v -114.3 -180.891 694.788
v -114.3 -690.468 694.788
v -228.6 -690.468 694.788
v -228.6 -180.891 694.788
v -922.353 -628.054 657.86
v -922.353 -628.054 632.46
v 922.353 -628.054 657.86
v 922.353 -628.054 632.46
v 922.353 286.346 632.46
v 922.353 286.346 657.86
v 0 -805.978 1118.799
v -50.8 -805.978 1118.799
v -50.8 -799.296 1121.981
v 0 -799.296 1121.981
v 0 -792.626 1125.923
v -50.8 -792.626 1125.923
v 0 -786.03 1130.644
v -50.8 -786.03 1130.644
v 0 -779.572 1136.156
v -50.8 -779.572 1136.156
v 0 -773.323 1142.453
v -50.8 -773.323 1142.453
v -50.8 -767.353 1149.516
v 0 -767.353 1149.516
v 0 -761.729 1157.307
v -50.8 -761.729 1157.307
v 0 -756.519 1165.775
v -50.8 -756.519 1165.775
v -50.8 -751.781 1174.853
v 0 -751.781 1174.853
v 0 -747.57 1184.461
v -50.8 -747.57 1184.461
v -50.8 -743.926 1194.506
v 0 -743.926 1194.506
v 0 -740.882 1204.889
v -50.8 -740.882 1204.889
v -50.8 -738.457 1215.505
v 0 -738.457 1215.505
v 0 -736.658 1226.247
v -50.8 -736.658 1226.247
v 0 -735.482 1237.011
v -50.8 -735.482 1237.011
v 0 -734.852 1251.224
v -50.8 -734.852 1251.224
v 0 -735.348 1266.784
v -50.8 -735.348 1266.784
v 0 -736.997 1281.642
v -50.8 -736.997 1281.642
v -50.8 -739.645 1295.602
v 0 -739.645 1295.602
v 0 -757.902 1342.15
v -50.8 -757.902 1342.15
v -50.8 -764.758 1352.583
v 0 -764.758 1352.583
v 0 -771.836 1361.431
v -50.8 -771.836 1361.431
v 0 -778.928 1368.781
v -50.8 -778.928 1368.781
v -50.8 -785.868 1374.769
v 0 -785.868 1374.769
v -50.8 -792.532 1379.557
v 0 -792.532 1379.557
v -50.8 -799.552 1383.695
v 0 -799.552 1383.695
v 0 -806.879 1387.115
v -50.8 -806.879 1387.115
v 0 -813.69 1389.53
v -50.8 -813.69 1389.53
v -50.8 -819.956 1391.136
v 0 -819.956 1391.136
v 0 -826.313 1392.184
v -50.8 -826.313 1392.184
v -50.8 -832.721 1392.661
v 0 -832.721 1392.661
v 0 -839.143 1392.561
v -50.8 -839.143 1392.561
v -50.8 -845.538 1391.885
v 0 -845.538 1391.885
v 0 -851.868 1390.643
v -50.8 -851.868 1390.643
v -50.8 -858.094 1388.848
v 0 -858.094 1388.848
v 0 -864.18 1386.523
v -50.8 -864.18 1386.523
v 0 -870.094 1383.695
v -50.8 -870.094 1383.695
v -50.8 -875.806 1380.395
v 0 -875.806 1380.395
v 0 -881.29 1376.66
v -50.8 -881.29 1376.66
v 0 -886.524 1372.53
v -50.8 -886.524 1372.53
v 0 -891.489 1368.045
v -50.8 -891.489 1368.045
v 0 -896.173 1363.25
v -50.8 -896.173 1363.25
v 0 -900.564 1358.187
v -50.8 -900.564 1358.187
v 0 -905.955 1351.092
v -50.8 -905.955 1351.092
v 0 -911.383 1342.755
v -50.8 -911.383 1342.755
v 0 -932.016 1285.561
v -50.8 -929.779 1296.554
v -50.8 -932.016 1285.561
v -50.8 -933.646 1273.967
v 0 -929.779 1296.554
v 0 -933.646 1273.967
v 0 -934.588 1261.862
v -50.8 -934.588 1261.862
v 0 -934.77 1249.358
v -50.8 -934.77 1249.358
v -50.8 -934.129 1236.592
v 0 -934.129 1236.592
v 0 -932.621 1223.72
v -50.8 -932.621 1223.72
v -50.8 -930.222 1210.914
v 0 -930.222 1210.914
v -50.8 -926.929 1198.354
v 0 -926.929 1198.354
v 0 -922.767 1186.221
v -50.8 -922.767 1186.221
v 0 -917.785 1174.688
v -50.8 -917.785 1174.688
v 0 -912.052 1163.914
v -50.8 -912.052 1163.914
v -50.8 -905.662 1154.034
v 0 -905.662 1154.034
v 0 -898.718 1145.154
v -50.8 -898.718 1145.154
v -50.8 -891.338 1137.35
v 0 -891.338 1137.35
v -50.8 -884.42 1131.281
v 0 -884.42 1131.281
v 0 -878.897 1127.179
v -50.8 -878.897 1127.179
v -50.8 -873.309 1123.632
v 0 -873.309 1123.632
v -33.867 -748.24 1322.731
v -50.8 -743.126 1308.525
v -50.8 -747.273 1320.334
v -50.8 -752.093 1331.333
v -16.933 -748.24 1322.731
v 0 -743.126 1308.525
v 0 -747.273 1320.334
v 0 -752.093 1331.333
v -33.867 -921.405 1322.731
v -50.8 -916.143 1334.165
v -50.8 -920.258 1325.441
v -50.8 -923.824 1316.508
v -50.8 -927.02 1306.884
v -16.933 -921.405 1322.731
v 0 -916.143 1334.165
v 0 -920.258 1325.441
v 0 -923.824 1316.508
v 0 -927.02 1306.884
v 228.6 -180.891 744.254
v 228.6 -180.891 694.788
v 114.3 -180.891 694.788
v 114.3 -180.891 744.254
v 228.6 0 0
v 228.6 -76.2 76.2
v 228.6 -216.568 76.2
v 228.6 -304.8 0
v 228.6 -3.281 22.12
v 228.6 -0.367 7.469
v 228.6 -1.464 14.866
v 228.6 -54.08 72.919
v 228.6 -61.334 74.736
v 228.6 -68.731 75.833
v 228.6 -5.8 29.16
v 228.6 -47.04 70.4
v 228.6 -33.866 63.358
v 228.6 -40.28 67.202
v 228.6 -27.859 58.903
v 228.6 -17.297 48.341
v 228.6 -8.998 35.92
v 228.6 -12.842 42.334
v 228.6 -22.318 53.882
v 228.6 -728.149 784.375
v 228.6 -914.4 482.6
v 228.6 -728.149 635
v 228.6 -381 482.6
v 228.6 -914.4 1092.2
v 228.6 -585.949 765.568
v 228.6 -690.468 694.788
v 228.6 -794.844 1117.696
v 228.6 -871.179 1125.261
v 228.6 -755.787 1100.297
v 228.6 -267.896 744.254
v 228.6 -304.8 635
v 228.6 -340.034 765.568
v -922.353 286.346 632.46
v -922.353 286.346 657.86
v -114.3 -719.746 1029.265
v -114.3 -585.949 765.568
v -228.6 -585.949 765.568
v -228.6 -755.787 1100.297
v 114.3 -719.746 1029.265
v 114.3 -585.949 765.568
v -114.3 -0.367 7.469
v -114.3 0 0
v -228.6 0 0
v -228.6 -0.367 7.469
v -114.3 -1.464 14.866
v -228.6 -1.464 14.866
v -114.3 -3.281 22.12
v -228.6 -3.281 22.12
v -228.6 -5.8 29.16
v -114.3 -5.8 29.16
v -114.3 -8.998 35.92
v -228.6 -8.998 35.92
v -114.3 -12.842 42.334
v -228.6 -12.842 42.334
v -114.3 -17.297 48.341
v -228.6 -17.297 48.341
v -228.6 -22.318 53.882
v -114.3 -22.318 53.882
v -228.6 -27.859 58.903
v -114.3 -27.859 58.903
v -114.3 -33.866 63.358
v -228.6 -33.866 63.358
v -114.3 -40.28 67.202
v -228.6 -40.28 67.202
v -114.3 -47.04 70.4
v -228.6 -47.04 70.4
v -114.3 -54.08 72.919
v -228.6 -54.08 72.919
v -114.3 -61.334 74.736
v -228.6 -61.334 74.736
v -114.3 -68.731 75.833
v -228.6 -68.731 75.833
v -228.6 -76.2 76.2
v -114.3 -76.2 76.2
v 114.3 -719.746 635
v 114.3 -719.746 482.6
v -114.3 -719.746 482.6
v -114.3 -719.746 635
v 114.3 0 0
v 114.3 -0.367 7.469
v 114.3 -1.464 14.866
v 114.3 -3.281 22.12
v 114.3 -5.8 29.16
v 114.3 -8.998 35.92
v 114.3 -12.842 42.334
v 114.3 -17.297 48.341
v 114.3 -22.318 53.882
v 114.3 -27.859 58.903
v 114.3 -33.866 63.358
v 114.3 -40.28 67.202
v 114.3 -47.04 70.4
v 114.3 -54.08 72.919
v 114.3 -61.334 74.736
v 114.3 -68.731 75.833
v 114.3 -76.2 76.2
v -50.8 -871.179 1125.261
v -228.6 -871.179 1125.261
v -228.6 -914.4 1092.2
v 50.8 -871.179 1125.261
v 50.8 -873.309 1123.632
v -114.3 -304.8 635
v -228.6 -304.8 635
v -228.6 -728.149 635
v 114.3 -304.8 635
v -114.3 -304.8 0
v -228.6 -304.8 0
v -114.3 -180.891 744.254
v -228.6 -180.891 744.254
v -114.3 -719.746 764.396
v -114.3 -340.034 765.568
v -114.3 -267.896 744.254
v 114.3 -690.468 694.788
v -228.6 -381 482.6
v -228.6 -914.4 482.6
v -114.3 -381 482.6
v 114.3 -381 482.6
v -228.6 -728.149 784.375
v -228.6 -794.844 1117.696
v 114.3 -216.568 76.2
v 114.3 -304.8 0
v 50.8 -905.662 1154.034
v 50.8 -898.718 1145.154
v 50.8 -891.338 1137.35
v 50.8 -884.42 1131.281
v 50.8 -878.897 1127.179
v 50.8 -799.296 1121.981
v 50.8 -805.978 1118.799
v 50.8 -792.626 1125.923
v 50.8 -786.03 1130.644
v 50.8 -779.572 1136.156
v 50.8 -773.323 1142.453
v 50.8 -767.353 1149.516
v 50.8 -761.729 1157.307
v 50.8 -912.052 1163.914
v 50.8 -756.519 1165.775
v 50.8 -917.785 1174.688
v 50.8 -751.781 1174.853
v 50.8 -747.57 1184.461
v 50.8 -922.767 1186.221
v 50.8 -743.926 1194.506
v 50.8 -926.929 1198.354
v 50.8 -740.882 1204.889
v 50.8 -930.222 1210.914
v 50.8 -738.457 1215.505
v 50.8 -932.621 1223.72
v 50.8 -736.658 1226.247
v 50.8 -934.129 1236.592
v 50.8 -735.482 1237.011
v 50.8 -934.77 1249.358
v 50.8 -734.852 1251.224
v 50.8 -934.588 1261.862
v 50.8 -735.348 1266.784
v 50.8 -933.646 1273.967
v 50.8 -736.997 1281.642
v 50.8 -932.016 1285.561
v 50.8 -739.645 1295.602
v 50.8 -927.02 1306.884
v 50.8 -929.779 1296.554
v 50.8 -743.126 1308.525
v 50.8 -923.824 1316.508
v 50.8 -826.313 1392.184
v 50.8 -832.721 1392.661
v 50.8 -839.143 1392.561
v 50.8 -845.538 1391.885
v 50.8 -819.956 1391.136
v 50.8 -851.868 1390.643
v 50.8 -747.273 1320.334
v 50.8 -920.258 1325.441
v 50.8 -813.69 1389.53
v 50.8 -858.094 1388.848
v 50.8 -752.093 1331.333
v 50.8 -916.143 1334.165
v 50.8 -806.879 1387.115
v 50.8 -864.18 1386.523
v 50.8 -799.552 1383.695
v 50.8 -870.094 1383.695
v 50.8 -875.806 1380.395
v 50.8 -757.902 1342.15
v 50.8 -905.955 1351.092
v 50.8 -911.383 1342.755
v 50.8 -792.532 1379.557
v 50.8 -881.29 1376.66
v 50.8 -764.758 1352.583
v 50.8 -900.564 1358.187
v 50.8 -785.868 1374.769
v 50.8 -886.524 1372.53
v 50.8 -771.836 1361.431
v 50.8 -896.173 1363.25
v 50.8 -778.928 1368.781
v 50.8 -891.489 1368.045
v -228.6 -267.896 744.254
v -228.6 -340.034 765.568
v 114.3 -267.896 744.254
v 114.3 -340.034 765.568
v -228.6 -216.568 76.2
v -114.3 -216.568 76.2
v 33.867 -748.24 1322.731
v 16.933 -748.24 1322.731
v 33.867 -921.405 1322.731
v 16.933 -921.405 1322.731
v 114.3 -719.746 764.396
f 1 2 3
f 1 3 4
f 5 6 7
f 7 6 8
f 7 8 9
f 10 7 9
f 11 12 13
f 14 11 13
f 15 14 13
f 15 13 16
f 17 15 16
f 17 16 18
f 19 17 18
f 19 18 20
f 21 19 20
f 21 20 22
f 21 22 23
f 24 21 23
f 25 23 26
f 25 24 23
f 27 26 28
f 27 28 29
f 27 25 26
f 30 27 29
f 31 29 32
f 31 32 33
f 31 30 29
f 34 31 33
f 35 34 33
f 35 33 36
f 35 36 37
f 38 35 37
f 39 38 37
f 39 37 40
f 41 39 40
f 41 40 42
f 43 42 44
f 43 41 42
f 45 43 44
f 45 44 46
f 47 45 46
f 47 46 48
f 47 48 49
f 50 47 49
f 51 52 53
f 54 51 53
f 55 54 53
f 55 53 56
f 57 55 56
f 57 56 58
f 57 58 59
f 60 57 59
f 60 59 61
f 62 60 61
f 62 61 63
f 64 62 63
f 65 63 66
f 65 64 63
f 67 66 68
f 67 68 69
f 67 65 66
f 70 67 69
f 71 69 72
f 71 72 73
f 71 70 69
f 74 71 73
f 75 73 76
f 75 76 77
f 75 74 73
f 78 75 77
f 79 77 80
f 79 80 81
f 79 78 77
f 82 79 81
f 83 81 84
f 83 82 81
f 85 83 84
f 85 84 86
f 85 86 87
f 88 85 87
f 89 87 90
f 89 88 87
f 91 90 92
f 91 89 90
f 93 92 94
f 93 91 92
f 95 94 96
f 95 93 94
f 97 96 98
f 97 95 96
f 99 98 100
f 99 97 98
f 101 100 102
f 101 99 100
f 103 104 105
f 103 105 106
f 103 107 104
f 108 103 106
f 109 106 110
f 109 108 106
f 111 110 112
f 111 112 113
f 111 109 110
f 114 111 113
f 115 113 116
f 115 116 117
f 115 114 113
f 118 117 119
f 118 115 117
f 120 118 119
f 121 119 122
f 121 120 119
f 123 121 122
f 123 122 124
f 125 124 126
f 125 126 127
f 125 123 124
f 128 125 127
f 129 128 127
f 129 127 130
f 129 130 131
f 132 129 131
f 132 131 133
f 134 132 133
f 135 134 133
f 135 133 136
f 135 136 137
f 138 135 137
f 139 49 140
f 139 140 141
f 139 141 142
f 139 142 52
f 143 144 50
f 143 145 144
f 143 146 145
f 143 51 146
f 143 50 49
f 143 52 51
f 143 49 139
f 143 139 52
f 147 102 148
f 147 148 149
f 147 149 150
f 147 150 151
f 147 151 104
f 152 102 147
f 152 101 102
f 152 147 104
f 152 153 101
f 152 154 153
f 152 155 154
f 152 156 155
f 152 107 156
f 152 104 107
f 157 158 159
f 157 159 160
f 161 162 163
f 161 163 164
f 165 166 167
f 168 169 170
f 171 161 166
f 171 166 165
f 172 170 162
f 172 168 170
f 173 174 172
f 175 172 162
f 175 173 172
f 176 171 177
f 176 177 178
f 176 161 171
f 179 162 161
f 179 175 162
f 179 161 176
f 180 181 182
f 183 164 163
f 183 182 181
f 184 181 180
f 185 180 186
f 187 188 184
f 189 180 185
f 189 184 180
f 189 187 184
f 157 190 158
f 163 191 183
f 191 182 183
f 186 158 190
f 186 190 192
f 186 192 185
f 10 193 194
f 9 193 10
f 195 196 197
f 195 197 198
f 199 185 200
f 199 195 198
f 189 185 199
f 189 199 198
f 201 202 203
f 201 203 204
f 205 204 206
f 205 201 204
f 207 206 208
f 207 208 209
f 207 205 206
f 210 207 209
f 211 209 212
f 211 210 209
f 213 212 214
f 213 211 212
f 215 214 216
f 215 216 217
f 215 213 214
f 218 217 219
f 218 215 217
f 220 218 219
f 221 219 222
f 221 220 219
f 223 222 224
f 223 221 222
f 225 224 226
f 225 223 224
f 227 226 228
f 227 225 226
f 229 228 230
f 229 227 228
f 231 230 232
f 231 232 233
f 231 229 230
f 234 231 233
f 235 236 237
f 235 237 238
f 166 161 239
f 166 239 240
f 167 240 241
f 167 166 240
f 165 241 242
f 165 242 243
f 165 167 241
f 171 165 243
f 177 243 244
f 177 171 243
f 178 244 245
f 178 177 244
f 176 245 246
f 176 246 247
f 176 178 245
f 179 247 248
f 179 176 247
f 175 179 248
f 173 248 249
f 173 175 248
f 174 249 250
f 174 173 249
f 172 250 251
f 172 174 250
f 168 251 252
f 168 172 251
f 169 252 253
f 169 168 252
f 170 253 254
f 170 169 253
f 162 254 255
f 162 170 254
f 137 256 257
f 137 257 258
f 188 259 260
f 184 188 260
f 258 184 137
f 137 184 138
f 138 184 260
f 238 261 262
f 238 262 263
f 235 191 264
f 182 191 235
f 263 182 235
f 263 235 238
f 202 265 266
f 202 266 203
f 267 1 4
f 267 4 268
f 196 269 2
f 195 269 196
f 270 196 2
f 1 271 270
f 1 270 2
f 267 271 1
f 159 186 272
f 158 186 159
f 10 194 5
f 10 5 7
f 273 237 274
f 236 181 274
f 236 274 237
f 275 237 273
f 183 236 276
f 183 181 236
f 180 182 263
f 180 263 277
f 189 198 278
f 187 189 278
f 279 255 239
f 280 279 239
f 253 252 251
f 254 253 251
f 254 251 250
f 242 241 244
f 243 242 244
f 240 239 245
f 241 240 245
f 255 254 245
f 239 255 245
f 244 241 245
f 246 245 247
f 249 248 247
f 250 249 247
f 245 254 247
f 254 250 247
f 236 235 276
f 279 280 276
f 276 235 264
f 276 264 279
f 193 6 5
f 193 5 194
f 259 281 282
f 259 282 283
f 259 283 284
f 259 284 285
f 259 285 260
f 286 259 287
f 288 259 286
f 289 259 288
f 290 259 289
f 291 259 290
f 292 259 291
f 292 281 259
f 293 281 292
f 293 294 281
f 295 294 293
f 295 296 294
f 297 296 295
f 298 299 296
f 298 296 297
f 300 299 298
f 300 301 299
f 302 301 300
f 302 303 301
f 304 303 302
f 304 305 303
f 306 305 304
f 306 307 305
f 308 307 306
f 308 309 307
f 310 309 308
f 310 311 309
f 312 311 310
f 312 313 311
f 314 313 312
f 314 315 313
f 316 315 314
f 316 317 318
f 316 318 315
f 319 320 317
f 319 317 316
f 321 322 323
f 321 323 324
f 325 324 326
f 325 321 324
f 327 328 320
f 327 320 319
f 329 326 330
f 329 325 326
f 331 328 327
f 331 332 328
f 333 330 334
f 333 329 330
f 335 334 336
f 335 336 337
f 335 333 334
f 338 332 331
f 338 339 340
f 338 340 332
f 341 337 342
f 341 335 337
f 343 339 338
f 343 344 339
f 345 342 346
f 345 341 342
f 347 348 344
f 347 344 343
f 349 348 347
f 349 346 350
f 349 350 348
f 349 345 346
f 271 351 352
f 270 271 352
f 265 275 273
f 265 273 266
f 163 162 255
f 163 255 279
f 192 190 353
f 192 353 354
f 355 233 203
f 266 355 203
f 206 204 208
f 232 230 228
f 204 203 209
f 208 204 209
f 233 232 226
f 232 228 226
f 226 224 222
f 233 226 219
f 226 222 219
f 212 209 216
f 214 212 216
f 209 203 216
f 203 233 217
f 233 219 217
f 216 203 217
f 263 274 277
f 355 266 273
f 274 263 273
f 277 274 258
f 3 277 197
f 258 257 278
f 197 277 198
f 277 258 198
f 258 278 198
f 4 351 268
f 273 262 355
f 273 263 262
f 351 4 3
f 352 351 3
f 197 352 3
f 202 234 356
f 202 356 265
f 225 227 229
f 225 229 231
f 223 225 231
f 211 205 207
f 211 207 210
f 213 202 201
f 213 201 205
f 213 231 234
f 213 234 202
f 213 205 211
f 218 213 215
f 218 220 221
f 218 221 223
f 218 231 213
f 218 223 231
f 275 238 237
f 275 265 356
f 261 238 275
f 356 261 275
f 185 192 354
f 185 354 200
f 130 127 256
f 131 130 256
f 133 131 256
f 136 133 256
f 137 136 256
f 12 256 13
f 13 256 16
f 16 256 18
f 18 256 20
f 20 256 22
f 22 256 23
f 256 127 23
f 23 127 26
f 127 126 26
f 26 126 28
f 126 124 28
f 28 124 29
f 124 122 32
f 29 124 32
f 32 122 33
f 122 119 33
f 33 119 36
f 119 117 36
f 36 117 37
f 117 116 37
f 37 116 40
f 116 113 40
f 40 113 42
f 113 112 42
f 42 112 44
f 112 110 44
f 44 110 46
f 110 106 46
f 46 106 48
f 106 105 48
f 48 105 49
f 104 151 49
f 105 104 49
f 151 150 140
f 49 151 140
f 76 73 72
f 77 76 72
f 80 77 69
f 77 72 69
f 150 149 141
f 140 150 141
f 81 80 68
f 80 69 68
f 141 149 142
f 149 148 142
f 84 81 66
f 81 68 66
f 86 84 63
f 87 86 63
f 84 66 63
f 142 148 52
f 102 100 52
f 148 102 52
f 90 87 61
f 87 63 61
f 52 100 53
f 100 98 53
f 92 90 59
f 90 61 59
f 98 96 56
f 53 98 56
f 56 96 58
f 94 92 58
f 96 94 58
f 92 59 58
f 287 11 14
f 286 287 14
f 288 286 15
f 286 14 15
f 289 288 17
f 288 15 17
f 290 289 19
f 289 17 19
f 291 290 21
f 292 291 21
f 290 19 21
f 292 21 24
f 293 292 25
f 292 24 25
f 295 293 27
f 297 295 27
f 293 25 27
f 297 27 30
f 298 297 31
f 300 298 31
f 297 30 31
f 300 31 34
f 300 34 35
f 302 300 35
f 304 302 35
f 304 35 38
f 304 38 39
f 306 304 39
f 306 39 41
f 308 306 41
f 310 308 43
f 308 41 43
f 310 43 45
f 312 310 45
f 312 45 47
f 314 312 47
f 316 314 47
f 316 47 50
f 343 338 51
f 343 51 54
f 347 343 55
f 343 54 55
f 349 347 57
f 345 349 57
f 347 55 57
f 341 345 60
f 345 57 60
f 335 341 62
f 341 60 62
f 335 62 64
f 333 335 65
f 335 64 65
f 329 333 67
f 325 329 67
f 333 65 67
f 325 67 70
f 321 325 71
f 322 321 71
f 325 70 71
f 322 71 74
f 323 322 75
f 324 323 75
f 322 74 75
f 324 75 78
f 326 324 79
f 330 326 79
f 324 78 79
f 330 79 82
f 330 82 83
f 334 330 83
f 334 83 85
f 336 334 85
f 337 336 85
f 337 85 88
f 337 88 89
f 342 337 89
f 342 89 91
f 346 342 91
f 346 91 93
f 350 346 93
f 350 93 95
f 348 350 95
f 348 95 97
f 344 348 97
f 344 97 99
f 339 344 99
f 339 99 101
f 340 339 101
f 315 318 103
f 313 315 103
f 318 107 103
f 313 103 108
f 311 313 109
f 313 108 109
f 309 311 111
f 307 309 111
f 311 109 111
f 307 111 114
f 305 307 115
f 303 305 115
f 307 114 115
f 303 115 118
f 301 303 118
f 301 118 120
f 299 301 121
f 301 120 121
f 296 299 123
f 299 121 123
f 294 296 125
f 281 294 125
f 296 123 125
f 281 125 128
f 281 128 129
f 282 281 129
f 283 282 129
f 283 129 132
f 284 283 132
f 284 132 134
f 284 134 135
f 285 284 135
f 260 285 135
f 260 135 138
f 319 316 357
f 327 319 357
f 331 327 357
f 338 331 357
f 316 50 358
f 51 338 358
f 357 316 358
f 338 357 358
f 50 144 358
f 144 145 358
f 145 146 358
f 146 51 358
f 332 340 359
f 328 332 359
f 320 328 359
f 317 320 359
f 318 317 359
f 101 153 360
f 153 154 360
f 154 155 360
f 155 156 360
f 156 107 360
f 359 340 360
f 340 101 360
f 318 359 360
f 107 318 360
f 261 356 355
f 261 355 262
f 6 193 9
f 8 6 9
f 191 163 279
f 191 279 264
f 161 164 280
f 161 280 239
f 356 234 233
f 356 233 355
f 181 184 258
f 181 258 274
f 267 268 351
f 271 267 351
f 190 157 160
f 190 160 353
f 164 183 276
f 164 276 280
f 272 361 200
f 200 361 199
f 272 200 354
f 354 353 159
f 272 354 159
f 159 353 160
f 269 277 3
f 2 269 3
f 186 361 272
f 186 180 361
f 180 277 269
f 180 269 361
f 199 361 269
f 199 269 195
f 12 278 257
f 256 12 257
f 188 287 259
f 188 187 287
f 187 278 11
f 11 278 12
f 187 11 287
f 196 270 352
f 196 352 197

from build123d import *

# Parameters (mm, degrees)
F1_DEPTH = 228.6
F2_W     = 875.777394
F2_H     = 1143.697206
F3_DEPTH = 114.3
F5_DEPTH = 50.8
F7_W     = 1844.705524
F7_H     = 914.4
F8_DEPTH = 25.4


with BuildPart() as f1:
    # F0 (on Right) → F1 (new body, symmetric)
    with BuildSketch(Plane.YZ):
        with BuildLine():
            Line((-304.8, 0), (0, 0))
            ThreePointArc((0, 0), (-22.318463, 53.881537), (-76.2, 76.2))
            Line((-76.2, 76.2), (-216.568421, 76.2))
            Line((-216.568421, 76.2), (-304.8, 635))
            Line((-304.8, 635), (-728.148997, 635))
            Line((-728.148997, 635), (-728.148997, 784.37531))
            Line((-728.148997, 784.37531), (-690.468192, 694.787979))
            Line((-690.468192, 694.787979), (-180.890664, 694.787979))
            Line((-180.890664, 694.787979), (-180.890664, 744.254053))
            Line((-180.890664, 744.254053), (-267.89552, 744.254053))
            Line((-267.89552, 744.254053), (-340.03377, 765.567601))
            Line((-340.03377, 765.567601), (-585.94879, 765.567601))
            Line((-585.94879, 765.567601), (-755.786777, 1100.297213))
            Line((-755.786777, 1100.297213), (-794.843912, 1117.695928))
            Line((-794.843912, 1117.695928), (-871.179223, 1125.26083))
            Line((-871.179223, 1125.26083), (-914.4, 1092.2))
            Line((-914.4, 1092.2), (-914.4, 482.6))
            Line((-914.4, 482.6), (-381, 482.6))
            Line((-381, 482.6), (-304.8, 0))
        make_face()
    extrude(amount=F1_DEPTH, both=True)

    # F2 (on Right) → F3 (cut, symmetric)
    with BuildSketch(Plane.YZ):
        with Locations((-281.857118, 526.775865)):
            Rectangle(F2_W, F2_H)
    extrude(amount=F3_DEPTH, both=True, mode=Mode.SUBTRACT)

    # F4 (on Right) → F5 (join, symmetric)
    with BuildSketch(Plane.YZ):
        with BuildLine():
            add(Edge.make_bspline(
                [(-834.822655, 1112.849355), (-661.657367, 1112.849355), (-748.240011, 1322.730958), (-834.822655, 1532.612562), (-921.405299, 1322.730958), (-1007.987943, 1112.849355), (-834.822655, 1112.849355)],
                knots=[0, 0, 0, 2.094395, 2.094395, 4.18879, 4.18879, 6.283185, 6.283185, 6.283185], degree=2, weights=[1, 0.5, 1, 0.5, 1, 0.5, 1]))
        make_face()
    extrude(amount=F5_DEPTH, both=True)


with BuildPart() as f8:
    # F7 (on offset) → F8 (new body)
    with BuildSketch(Plane.XY.offset(632.46)):
        with Locations((0, -170.853511)):
            Rectangle(F7_W, F7_H)
    extrude(amount=F8_DEPTH)


solid = Compound([f1.part, f8.part])
